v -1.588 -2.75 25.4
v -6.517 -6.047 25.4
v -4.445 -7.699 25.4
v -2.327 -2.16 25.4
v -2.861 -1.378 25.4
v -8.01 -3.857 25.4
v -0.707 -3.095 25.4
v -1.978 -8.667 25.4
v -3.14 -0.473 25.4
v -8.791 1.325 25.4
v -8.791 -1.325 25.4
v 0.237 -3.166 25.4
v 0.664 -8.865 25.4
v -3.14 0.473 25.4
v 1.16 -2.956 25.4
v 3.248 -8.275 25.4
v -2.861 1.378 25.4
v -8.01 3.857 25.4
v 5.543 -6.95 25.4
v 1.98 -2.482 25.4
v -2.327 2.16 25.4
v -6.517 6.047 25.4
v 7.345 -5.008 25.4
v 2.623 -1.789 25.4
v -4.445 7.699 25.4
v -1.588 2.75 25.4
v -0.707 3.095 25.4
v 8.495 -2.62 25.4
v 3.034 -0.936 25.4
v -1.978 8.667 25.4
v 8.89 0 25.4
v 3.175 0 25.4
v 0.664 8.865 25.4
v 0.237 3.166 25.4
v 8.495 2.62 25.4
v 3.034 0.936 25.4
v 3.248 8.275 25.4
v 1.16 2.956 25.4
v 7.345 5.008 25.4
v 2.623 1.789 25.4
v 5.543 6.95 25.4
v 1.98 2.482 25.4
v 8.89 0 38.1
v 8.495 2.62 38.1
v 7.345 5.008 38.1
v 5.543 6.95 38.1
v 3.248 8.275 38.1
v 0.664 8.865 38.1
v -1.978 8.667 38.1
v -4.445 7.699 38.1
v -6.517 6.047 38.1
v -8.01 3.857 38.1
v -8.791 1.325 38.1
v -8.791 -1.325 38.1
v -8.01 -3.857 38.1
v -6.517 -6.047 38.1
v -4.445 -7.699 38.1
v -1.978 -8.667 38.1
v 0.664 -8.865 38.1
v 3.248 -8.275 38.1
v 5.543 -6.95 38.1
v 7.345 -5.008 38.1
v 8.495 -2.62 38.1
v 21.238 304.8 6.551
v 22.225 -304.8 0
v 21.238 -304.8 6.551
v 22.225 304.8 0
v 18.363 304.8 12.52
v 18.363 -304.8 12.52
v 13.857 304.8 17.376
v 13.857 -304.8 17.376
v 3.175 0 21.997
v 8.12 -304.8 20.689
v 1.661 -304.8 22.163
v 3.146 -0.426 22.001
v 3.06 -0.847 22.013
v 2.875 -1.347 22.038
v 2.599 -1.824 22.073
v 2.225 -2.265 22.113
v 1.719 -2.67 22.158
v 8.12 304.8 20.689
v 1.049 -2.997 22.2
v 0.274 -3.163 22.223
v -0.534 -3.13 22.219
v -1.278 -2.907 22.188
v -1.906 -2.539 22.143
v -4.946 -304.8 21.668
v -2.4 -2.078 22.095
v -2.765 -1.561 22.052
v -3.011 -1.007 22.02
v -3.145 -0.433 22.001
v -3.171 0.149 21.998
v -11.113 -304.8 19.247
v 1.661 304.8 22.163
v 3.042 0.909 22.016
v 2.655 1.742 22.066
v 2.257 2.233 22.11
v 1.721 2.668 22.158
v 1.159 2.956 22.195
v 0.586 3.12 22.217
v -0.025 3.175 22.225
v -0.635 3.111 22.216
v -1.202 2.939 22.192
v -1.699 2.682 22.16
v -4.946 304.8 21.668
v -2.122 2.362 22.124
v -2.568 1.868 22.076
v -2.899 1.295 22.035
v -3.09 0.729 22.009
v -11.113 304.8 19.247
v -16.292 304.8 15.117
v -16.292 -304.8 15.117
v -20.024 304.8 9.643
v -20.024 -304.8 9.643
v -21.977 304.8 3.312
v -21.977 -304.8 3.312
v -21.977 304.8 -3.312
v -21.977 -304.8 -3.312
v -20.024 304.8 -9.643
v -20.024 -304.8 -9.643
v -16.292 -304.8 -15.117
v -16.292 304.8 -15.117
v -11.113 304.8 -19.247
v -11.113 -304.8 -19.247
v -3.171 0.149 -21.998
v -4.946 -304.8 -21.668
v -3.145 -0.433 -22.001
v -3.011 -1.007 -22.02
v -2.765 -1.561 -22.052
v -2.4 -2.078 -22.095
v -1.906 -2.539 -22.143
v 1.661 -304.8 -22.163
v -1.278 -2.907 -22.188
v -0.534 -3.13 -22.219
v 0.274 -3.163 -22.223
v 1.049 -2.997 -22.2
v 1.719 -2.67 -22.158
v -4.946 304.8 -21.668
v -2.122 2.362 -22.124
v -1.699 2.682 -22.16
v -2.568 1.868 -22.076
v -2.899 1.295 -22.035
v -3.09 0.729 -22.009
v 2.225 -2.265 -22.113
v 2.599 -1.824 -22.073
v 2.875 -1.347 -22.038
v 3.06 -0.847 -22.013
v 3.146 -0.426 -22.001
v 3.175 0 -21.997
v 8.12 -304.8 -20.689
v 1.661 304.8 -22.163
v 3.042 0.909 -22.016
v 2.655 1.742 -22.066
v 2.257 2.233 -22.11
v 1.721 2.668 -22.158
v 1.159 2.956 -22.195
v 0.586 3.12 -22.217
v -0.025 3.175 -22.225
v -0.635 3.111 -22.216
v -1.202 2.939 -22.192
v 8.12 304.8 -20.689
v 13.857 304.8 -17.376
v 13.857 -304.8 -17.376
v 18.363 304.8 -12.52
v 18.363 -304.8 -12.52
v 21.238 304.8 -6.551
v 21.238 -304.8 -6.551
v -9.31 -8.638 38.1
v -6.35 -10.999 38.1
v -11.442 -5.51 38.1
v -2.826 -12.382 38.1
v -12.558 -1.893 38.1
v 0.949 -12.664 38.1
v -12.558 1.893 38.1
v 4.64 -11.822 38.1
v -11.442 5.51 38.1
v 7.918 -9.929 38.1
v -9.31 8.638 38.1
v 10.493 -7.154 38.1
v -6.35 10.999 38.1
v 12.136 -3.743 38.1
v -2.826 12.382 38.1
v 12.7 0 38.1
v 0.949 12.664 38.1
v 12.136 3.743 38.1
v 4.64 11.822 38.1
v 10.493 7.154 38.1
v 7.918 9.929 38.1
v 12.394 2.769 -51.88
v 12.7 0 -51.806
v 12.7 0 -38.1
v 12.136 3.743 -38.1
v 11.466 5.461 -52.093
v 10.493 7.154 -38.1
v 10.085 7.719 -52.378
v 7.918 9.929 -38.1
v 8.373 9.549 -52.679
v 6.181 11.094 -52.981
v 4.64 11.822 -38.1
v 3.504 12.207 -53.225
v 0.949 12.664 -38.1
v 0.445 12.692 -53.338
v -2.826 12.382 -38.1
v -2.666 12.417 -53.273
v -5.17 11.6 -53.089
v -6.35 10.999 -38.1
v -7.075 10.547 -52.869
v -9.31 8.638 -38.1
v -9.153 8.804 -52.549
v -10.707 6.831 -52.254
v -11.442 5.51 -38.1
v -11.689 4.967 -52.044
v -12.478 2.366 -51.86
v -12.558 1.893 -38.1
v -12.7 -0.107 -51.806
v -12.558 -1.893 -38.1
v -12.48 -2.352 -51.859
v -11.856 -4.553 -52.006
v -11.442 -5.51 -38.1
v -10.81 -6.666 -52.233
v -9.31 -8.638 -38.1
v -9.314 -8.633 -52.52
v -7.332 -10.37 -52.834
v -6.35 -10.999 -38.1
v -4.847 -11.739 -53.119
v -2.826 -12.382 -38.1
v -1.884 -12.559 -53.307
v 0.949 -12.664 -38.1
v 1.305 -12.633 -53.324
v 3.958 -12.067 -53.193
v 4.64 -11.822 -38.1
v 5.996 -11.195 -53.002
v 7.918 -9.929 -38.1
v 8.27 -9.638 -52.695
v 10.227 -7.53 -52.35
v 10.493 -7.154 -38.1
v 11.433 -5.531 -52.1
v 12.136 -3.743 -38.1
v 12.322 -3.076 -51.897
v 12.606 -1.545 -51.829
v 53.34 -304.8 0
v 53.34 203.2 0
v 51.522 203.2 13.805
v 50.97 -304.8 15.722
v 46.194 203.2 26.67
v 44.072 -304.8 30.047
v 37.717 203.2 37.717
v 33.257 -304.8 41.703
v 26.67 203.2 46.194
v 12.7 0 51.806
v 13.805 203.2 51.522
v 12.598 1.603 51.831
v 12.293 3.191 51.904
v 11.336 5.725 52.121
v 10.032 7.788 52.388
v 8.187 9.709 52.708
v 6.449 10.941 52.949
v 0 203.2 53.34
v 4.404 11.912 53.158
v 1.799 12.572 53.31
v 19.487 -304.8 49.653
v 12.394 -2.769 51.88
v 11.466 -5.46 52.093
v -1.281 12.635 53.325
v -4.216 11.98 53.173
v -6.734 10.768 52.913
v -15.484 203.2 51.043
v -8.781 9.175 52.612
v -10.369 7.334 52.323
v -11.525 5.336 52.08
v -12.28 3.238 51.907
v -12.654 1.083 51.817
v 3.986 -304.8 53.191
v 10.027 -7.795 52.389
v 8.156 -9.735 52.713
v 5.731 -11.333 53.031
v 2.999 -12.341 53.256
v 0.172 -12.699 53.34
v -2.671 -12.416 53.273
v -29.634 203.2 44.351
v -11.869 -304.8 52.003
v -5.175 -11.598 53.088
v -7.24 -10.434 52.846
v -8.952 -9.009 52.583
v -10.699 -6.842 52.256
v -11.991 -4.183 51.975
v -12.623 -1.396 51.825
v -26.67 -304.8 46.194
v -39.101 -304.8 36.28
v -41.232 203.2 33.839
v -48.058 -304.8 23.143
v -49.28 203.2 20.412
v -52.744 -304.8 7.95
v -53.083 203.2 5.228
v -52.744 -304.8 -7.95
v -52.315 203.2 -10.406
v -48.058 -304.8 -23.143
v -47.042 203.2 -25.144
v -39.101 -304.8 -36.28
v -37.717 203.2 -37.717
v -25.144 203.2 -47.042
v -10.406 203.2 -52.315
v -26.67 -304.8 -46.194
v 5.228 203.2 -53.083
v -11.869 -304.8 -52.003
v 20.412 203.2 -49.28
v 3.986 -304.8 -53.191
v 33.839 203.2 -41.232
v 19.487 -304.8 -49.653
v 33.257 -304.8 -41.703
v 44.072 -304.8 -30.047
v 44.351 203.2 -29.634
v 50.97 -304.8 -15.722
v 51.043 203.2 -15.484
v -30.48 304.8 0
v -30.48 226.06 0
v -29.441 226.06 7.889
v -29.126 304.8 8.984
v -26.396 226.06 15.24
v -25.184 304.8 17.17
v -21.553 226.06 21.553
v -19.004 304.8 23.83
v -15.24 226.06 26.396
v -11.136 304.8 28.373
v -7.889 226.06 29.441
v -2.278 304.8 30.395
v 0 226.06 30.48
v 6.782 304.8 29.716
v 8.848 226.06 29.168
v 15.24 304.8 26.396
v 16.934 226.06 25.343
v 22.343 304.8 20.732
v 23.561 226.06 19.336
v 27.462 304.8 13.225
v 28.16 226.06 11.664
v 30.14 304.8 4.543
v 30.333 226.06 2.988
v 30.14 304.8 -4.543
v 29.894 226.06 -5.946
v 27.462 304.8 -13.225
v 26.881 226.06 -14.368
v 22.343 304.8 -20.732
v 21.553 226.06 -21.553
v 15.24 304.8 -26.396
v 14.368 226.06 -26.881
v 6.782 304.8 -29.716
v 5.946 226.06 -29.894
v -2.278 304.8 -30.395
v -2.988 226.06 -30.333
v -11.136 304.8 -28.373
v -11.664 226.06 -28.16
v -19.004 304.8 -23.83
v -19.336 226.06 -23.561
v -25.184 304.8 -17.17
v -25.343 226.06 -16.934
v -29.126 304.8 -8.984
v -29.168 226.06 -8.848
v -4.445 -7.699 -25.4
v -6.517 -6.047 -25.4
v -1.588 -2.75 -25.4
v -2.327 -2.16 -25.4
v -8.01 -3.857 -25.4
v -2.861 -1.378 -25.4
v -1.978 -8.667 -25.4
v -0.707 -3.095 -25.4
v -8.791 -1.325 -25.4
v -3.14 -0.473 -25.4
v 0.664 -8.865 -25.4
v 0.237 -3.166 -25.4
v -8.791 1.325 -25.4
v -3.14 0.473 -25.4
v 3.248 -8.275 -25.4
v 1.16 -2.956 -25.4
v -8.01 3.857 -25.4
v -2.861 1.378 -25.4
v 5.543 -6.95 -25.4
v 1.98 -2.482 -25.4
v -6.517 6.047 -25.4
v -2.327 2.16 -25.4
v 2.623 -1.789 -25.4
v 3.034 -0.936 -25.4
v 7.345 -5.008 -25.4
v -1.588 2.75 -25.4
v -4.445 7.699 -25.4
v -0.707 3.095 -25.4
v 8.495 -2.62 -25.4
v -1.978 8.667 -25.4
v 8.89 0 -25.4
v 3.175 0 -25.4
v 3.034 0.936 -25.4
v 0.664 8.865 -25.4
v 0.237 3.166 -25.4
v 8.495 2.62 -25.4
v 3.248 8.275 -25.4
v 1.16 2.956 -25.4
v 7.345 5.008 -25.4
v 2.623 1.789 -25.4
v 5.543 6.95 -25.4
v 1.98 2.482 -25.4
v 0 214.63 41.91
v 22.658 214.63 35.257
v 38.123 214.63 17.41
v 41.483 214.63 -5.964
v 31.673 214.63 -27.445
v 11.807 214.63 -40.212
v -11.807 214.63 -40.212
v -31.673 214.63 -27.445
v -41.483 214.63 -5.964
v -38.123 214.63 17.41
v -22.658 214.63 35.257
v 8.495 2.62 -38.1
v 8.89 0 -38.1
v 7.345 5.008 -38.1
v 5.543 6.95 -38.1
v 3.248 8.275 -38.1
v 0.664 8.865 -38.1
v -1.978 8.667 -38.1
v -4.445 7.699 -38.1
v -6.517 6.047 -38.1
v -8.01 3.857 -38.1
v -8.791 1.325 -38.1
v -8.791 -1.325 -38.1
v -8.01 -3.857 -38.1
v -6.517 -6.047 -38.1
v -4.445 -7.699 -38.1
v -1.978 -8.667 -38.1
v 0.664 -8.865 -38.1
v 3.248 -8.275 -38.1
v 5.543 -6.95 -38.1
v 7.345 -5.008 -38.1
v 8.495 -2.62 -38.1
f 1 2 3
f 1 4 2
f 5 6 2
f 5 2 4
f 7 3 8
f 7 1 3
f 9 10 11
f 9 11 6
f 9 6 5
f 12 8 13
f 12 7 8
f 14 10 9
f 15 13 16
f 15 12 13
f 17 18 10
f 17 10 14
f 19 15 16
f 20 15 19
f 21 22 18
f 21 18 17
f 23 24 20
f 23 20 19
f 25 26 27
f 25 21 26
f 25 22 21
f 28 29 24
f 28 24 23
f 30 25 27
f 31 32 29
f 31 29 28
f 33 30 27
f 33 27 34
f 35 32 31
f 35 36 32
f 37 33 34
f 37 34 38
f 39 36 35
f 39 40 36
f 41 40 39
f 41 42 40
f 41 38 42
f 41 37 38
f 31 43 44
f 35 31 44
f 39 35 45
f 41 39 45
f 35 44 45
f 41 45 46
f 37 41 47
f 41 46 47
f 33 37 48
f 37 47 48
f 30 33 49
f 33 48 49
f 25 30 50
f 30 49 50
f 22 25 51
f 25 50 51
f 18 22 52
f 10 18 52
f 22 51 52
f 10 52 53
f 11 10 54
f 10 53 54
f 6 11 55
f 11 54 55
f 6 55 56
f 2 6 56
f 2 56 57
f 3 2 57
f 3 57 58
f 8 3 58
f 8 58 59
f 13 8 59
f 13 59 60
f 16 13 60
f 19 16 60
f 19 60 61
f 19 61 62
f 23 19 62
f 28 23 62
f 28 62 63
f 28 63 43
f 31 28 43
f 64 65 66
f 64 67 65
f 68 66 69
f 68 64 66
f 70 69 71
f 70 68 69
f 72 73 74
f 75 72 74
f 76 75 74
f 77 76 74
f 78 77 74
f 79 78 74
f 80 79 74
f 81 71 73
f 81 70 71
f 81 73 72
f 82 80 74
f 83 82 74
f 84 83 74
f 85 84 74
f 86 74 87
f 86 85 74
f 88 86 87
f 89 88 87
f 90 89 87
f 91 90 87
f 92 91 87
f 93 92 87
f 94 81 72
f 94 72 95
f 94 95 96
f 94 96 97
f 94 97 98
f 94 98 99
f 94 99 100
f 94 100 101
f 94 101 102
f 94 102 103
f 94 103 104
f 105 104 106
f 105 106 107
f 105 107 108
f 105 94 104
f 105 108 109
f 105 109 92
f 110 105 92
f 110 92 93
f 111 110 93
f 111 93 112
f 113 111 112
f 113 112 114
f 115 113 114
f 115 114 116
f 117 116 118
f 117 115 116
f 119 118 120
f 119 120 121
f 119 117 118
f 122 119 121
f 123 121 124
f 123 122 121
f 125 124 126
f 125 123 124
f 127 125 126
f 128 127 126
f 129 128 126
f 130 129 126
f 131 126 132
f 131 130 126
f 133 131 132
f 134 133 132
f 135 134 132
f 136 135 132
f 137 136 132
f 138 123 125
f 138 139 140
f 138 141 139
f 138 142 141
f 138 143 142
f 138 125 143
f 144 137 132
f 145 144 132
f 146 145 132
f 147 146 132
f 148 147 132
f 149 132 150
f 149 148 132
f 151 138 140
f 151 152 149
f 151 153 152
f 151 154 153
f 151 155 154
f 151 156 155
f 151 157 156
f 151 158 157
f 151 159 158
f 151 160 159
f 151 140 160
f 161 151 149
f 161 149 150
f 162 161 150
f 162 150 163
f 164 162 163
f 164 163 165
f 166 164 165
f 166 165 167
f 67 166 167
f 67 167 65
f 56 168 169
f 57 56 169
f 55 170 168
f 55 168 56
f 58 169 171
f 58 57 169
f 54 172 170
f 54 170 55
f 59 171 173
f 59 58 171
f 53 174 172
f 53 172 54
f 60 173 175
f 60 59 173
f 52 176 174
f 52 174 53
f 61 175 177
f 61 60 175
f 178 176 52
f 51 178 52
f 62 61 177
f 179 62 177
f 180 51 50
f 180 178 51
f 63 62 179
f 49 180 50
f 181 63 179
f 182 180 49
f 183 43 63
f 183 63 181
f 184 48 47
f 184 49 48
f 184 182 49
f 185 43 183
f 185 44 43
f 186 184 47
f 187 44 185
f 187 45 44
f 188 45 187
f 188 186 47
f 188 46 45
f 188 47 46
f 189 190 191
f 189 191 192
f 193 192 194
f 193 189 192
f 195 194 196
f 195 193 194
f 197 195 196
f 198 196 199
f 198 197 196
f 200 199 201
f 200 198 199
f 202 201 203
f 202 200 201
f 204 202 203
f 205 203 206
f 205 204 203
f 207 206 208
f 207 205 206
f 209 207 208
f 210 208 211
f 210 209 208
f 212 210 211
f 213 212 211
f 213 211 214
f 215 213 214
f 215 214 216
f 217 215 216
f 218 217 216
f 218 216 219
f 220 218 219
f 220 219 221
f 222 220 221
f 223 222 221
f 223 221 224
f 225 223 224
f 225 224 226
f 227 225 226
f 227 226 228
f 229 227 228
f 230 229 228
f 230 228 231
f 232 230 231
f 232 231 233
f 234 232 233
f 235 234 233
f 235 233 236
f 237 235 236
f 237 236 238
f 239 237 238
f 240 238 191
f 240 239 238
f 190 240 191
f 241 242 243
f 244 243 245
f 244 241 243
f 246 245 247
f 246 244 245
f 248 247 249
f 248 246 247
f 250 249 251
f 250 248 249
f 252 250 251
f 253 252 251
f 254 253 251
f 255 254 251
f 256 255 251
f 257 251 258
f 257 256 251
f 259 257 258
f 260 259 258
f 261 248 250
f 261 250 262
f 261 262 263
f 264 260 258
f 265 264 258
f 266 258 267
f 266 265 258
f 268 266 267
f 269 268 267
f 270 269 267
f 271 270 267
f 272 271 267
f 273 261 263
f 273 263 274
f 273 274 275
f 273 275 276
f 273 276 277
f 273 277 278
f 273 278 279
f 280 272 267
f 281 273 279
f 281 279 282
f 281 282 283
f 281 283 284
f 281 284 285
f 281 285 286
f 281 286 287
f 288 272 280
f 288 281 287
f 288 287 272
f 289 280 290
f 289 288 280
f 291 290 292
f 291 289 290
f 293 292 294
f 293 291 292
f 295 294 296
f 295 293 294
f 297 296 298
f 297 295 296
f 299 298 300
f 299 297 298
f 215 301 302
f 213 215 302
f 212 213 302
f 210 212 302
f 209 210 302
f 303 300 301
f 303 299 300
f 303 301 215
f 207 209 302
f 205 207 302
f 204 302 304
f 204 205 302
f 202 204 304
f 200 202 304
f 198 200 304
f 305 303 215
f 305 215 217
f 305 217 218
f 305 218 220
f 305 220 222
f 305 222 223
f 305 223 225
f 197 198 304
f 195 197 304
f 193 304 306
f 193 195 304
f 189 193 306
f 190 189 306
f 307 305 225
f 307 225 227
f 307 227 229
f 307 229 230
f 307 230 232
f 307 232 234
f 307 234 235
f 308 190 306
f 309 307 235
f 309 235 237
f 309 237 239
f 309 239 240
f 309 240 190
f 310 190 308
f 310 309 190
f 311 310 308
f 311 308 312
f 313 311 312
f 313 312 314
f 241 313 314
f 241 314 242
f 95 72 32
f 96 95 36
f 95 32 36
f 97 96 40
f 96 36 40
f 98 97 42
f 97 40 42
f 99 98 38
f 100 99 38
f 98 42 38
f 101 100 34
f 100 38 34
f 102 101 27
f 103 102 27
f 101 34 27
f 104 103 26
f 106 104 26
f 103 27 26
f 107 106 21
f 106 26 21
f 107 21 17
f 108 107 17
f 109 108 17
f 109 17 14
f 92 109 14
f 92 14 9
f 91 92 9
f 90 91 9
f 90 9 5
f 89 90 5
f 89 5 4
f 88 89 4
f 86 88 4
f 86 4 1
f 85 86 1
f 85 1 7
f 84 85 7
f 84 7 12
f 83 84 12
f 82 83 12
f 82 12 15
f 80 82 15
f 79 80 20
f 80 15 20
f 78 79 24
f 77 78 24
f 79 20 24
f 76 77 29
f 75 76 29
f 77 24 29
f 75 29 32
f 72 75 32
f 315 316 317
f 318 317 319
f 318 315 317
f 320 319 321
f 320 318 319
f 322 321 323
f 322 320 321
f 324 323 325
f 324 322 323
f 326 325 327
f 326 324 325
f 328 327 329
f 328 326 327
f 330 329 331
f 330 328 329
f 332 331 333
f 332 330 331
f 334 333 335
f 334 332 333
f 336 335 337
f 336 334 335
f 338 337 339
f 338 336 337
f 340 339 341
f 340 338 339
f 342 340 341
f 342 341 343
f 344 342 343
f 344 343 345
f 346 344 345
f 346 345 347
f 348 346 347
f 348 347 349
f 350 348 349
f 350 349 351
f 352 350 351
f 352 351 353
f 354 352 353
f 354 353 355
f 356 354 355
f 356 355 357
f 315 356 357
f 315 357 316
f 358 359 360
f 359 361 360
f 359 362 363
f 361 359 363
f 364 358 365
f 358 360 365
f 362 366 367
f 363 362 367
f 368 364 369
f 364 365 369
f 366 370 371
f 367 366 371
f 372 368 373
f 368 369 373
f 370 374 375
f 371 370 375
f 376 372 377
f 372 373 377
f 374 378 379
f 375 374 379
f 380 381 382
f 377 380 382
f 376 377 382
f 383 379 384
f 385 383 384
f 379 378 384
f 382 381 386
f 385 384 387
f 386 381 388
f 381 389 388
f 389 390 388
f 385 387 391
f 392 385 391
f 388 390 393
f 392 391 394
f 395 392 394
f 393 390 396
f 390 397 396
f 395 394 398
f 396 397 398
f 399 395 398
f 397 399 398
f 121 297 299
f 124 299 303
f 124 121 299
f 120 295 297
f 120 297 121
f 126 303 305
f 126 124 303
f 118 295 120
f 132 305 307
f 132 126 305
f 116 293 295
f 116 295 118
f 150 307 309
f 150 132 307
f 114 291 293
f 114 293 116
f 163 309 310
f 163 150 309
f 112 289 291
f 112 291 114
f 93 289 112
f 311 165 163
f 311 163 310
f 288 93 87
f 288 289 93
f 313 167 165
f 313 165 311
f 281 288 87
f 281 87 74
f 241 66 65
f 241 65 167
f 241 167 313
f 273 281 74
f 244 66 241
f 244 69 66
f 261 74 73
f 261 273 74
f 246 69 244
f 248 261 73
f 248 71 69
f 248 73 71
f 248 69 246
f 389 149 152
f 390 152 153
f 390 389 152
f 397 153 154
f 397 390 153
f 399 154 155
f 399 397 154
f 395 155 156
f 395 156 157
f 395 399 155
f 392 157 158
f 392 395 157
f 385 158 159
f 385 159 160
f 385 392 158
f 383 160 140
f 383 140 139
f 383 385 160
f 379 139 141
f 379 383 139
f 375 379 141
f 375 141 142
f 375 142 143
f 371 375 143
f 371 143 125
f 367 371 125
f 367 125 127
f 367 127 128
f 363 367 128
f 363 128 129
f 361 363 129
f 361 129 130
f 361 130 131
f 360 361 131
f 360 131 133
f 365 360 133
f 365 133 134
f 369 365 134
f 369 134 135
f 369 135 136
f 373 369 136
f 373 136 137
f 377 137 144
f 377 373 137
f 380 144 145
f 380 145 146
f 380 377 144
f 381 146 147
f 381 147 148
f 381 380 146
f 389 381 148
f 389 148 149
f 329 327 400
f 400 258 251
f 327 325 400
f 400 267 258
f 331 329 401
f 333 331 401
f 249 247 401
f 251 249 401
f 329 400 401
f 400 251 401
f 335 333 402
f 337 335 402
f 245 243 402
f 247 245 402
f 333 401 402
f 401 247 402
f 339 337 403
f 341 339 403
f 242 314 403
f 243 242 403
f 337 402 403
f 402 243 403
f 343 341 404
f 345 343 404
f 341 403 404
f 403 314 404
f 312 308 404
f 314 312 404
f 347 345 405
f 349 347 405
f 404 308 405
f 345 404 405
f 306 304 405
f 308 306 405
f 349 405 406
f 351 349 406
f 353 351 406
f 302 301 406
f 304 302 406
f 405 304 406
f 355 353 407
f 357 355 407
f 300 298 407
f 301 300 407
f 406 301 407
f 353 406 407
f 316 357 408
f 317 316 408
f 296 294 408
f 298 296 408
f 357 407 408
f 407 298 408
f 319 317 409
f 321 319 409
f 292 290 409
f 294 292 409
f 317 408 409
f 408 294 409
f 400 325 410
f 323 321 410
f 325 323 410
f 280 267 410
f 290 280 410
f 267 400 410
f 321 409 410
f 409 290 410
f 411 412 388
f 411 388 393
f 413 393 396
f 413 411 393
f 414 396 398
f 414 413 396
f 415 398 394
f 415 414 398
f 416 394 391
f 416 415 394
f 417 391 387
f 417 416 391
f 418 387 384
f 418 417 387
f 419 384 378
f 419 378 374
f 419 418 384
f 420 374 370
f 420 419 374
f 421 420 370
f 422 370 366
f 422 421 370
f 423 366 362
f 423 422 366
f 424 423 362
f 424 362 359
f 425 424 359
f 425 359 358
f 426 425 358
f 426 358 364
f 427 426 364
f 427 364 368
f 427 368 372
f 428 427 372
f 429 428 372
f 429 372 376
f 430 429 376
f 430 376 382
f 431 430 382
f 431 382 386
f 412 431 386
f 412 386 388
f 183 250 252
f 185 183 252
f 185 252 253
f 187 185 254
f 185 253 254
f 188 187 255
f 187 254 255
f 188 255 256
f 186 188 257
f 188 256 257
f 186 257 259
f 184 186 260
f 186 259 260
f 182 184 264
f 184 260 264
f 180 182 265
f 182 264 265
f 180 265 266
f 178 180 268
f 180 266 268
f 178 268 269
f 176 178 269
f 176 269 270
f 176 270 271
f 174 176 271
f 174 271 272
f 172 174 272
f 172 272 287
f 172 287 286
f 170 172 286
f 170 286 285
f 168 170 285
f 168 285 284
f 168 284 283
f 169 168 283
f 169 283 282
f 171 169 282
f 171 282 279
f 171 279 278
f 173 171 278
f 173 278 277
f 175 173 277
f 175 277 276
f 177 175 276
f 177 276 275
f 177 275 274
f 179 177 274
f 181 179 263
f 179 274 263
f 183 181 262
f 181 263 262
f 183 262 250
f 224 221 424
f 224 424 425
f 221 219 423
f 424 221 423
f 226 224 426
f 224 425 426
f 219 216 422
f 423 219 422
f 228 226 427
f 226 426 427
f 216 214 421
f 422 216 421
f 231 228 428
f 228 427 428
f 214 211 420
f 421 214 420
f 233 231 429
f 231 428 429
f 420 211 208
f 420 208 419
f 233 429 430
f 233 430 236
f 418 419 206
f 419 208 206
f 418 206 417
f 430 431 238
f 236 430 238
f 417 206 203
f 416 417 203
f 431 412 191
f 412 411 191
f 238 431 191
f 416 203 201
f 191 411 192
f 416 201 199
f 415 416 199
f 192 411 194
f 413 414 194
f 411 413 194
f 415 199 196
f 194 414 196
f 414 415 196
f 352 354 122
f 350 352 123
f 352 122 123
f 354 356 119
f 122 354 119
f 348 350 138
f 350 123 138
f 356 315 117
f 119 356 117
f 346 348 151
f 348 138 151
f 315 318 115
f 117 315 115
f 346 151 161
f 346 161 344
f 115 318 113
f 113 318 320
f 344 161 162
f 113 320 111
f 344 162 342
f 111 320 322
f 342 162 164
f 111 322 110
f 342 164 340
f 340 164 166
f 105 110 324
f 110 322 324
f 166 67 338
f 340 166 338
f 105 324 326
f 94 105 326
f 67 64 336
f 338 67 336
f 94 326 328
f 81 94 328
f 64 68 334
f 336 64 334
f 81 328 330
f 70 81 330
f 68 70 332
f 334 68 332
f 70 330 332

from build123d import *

# Parameters (mm, degrees)
F0_R      = 53.34
F0_R_2    = 22.225
F1_DEPTH  = 304.8
F4_R      = 53.34
F4_R_2    = 30.48
F5_DEPTH  = 101.6
F10_R     = 12.7
F10_R_2   = 8.89
F10_R_3   = 3.175
F11_DEPTH = 15.24
F12_DEPTH = 27.94
F13_DEPTH = 32.3429548439
F14_R     = 12.7
F14_R_2   = 8.89
F14_R_3   = 3.175
F15_DEPTH = 15.24
F16_DEPTH = 27.94
F17_DEPTH = 32.3429548439


with BuildPart() as f1:
    # F0 (on Front) → F1 (new body, symmetric)
    with BuildSketch(Plane.XZ):
        Circle(F0_R)
        Circle(F0_R_2, mode=Mode.SUBTRACT)
    extrude(amount=F1_DEPTH, both=True)

    # F4 (on offset) → F5 (cut)
    with BuildSketch(Plane(origin=(0, 304.8, 0), x_dir=(-1, 0, 0), z_dir=(0, 1, 0))):
        Circle(F4_R)
        Circle(F4_R_2, mode=Mode.SUBTRACT)
    extrude(amount=-F5_DEPTH, mode=Mode.SUBTRACT)

    # F6 (on Right) → F7 (revolve)
    with BuildSketch(Plane.YZ):
        Polygon((203.2, 53.34), (203.2, 30.48), (226.06, 30.48), align=None)
    revolve(axis=Axis((0, 101.6, 0), (0, 1, 0)))

    # F10 (on offset) → F11 (cut)
    with BuildSketch(Plane.XY.offset(53.34)):
        Circle(F10_R)
        Circle(F10_R_2, mode=Mode.SUBTRACT)
        Circle(F10_R_2)
        Circle(F10_R_3, mode=Mode.SUBTRACT)
        Circle(F10_R_3)
    extrude(amount=-F11_DEPTH, mode=Mode.SUBTRACT)

    # F10 (on offset) → F12 (cut)
    with BuildSketch(Plane.XY.offset(53.34)):
        Circle(F10_R_2)
        Circle(F10_R_3, mode=Mode.SUBTRACT)
        Circle(F10_R_3)
    extrude(amount=-F12_DEPTH, mode=Mode.SUBTRACT)

    # F10 (on offset) → F13 (cut, up to face)
    with BuildSketch(Plane.XY.offset(53.34)):
        Circle(F10_R_3)
    extrude(amount=-F13_DEPTH, mode=Mode.SUBTRACT)

    # F14 (on offset) → F15 (cut)
    with BuildSketch(Plane.XY.offset(-53.34)):
        Circle(F14_R)
        Circle(F14_R_2, mode=Mode.SUBTRACT)
        Circle(F14_R_2)
        Circle(F14_R_3, mode=Mode.SUBTRACT)
        Circle(F14_R_3)
    extrude(amount=F15_DEPTH, mode=Mode.SUBTRACT)

    # F14 (on offset) → F16 (cut)
    with BuildSketch(Plane.XY.offset(-53.34)):
        Circle(F14_R_2)
        Circle(F14_R_3, mode=Mode.SUBTRACT)
        Circle(F14_R_3)
    extrude(amount=F16_DEPTH, mode=Mode.SUBTRACT)

    # F14 (on offset) → F17 (cut, up to face)
    with BuildSketch(Plane.XY.offset(-53.34)):
        Circle(F14_R_3)
    extrude(amount=F17_DEPTH, mode=Mode.SUBTRACT)


solid = f1.part
